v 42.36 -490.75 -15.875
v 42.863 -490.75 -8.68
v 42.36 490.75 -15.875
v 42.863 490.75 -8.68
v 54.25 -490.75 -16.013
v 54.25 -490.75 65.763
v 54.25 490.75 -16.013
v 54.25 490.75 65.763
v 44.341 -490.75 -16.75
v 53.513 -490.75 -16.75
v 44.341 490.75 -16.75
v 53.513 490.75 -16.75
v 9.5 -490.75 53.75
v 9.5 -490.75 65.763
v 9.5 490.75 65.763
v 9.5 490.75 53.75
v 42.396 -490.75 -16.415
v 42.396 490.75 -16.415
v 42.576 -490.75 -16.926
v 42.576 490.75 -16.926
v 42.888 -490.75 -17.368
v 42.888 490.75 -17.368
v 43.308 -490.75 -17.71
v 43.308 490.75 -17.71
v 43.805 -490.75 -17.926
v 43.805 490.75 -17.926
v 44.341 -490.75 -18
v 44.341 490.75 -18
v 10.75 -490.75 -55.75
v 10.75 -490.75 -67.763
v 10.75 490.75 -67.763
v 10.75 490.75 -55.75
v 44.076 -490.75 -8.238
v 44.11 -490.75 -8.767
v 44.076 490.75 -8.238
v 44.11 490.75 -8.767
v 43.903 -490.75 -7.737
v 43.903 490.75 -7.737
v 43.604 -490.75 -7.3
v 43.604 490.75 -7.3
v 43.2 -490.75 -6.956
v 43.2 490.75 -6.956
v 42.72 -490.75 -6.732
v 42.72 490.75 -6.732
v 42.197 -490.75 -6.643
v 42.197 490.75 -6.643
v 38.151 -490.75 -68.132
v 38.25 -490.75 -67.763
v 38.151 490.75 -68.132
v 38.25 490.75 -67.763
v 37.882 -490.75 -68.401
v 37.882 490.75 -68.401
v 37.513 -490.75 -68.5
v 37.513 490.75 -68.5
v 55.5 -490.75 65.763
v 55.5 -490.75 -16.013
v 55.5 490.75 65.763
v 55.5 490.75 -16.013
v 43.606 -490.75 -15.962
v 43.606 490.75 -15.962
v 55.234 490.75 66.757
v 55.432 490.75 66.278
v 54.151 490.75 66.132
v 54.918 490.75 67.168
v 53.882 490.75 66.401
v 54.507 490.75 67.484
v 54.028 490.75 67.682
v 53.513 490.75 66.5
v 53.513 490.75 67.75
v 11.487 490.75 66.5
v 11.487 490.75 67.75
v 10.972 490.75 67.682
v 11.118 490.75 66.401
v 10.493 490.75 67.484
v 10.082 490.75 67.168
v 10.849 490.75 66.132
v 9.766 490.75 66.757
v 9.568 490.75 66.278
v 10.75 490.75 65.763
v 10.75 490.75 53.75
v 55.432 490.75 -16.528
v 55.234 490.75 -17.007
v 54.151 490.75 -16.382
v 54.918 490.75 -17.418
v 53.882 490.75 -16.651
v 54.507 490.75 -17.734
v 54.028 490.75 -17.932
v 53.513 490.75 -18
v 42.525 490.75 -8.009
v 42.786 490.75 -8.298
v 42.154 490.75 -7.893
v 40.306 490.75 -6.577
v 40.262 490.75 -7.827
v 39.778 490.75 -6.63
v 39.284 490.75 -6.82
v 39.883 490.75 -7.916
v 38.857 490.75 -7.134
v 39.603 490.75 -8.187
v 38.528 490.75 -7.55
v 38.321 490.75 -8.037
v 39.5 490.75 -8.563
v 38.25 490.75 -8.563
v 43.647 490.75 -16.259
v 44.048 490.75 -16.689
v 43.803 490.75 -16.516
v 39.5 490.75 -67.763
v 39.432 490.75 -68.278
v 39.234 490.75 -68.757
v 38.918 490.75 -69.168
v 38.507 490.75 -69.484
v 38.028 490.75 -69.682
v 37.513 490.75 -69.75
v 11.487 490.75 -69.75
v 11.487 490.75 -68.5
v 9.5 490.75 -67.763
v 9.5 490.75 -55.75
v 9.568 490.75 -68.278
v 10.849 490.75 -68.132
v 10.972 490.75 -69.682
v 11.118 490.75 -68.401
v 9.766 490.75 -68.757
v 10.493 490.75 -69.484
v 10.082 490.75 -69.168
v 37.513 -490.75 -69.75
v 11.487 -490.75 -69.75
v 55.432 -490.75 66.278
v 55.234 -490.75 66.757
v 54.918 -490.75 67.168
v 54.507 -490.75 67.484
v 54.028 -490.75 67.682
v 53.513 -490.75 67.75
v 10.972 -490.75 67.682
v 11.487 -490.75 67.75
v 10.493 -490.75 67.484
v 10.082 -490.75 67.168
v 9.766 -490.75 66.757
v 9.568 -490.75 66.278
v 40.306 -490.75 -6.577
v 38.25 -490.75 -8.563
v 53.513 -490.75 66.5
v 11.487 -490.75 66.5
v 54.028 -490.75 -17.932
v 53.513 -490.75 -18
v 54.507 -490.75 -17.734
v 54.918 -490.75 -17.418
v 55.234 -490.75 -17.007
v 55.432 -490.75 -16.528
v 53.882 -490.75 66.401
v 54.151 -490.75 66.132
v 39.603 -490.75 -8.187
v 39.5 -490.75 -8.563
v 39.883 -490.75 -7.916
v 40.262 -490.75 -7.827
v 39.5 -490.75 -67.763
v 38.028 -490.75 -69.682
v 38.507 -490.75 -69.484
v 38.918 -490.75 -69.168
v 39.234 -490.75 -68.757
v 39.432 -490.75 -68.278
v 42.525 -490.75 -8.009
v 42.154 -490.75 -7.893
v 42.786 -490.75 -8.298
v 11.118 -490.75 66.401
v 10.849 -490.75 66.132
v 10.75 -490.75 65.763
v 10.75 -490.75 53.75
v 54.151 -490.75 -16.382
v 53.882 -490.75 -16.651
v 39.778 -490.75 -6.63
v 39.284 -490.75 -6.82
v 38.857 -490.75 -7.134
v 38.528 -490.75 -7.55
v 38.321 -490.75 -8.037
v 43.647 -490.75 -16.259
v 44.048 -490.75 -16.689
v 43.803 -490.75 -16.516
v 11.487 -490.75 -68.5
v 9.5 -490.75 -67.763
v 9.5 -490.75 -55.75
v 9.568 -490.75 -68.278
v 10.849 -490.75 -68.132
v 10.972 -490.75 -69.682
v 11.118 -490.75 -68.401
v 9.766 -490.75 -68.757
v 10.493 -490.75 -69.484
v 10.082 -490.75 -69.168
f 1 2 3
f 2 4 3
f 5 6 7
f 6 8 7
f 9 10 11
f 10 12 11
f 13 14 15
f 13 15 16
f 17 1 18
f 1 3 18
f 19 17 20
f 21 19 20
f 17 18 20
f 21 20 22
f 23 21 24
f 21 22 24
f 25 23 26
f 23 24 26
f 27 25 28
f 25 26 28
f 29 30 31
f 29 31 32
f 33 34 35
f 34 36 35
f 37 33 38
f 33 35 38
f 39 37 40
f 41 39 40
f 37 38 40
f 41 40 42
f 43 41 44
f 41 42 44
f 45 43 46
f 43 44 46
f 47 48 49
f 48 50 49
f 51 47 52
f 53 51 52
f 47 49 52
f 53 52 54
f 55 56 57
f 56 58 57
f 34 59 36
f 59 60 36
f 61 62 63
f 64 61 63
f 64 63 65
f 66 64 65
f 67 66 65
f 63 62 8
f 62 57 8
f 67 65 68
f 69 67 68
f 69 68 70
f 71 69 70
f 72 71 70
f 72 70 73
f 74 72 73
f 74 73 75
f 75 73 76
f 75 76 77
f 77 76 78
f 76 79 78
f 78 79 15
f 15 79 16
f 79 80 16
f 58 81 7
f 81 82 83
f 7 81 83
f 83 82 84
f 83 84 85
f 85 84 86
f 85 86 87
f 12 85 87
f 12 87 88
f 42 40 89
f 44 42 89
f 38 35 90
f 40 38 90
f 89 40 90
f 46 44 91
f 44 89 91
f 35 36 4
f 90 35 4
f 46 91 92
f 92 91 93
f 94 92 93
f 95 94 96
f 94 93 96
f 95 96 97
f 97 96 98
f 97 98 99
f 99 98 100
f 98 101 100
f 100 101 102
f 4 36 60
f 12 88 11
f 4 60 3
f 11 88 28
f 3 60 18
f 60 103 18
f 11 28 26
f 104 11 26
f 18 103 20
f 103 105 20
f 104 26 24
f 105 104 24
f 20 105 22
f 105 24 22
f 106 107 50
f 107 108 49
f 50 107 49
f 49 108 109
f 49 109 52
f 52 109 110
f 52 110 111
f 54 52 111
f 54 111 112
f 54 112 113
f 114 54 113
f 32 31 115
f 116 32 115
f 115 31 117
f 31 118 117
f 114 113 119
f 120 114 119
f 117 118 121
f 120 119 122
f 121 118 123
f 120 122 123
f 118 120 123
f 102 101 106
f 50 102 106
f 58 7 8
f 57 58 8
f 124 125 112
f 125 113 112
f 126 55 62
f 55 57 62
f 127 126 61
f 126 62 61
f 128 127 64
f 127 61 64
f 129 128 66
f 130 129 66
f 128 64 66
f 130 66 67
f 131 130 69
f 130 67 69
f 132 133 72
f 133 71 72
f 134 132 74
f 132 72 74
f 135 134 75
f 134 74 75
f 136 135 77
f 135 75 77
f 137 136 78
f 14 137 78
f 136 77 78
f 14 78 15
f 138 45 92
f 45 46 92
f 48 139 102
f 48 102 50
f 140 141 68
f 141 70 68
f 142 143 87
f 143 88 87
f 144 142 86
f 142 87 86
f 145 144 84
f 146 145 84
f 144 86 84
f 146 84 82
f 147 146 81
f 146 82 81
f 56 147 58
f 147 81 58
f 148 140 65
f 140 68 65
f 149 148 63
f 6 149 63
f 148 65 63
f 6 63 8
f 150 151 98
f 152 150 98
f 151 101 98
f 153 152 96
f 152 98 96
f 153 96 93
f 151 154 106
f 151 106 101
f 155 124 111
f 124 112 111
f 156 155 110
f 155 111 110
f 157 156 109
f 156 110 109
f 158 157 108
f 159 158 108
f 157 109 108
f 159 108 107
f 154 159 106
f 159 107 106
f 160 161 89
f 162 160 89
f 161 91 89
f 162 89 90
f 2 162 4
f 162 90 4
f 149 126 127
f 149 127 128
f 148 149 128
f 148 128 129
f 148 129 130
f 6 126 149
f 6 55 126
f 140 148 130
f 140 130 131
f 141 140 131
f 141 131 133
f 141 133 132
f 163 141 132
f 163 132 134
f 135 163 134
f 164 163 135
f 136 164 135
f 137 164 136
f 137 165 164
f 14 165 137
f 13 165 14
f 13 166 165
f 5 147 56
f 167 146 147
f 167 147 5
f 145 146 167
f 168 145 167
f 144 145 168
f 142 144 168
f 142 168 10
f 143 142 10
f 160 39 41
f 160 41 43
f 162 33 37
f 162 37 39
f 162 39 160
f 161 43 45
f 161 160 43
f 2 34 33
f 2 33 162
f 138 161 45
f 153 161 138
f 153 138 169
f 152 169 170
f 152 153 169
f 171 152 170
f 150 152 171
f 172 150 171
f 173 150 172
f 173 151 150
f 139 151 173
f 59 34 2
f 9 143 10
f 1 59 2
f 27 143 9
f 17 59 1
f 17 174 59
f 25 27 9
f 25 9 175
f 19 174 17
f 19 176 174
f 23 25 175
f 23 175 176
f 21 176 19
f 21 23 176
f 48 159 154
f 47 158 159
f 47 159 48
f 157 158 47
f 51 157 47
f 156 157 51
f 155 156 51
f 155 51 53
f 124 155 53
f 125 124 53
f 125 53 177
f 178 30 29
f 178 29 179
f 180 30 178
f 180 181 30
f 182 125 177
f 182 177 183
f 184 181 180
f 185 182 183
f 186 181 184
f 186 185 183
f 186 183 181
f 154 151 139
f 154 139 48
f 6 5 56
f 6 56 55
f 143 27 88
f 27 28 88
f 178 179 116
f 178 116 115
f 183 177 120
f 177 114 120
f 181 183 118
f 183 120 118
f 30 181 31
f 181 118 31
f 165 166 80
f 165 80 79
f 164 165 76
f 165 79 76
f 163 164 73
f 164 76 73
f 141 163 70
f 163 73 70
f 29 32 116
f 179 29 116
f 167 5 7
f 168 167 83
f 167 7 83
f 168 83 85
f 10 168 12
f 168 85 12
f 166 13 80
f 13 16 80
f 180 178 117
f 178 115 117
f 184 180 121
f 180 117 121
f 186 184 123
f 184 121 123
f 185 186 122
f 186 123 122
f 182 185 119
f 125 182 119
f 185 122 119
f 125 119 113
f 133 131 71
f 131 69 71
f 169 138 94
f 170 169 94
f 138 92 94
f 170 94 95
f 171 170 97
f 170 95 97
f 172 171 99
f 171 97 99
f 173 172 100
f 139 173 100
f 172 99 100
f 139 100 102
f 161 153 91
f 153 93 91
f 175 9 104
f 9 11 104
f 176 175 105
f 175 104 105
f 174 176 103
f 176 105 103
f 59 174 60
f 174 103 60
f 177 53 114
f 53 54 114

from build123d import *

# Parameters (mm, degrees)
BASE_FLANGE1_DEPTH = 490.75


# Sheet-metal steps are written as plain solids
with BuildPart() as part:
    # Sketch1 → Base-Flange1 (new, symmetric)
    with BuildSketch(Plane(origin=(0, 0, 0), x_dir=(1, 0, 0), z_dir=(0, 1, 0))):
        with BuildLine():
            Line((9.5, 55.75), (9.5, 67.7634))
            ThreePointArc((9.5, 67.7634), (10.081861668, 69.168138332), (11.4866, 69.75))
            Line((11.4866, 69.75), (37.5134, 69.75))
            ThreePointArc((37.5134, 69.75), (38.918138332, 69.168138332), (39.5, 67.7634))
            Line((39.5, 67.7634), (39.5, 18.25))
            Line((39.5, 18.25), (39.5, 8.562771629))
            ThreePointArc((39.5, 8.562771629), (39.724914644, 8.032905932), (40.262306969, 7.826620346))
            Line((40.262306969, 7.826620346), (42.153527557, 7.892663224))
            ThreePointArc((42.153527557, 7.892663224), (42.675221066, 8.135932903), (42.862626267, 8.680197126))
            Line((42.862626267, 8.680197126), (42.359529101, 15.874821789))
            ThreePointArc((42.359529101, 15.874821789), (42.88838258, 17.368257942), (44.341289843, 18))
            Line((44.341289843, 18), (53.5134, 18))
            ThreePointArc((53.5134, 18), (54.918138332, 17.418138332), (55.5, 16.0134))
            Line((55.5, 16.0134), (55.5, -20.75))
            Line((55.5, -20.75), (55.5, -65.7634))
            ThreePointArc((55.5, -65.7634), (54.918138332, -67.168138332), (53.5134, -67.75))
            Line((53.5134, -67.75), (39.5, -67.75))
            Line((39.5, -67.75), (11.4866, -67.75))
            ThreePointArc((11.4866, -67.75), (10.081861668, -67.168138332), (9.5, -65.7634))
            Line((9.5, -65.7634), (9.5, -53.75))
            Line((9.5, -53.75), (10.75, -53.75))
            Line((10.75, -53.75), (10.75, -65.7634))
            ThreePointArc((10.75, -65.7634), (10.965745145, -66.284254855), (11.4866, -66.5))
            Line((11.4866, -66.5), (39.5, -66.5))
            Line((39.5, -66.5), (53.5134, -66.5))
            ThreePointArc((53.5134, -66.5), (54.034254855, -66.284254855), (54.25, -65.7634))
            Line((54.25, -65.7634), (54.25, -20.75))
            Line((54.25, -20.75), (54.25, 16.0134))
            ThreePointArc((54.25, 16.0134), (54.034254855, 16.534254855), (53.5134, 16.75))
            Line((53.5134, 16.75), (44.341289843, 16.75))
            ThreePointArc((44.341289843, 16.75), (43.802574707, 16.515759992), (43.606484164, 15.962017381))
            Line((43.606484164, 15.962017381), (44.10958133, 8.767392718))
            ThreePointArc((44.10958133, 8.767392718), (43.604152098, 7.299519645), (42.197151928, 6.64342469))
            Line((42.197151928, 6.64342469), (40.30593134, 6.577381812))
            ThreePointArc((40.30593134, 6.577381812), (38.856591681, 7.133731182), (38.25, 8.562771629))
            Line((38.25, 8.562771629), (38.25, 18.25))
            Line((38.25, 18.25), (38.25, 67.7634))
            ThreePointArc((38.25, 67.7634), (38.034254855, 68.284254855), (37.5134, 68.5))
            Line((37.5134, 68.5), (11.4866, 68.5))
            ThreePointArc((11.4866, 68.5), (10.965745145, 68.284254855), (10.75, 67.7634))
            Line((10.75, 67.7634), (10.75, 55.75))
            Line((10.75, 55.75), (9.5, 55.75))
        make_face()
    extrude(amount=BASE_FLANGE1_DEPTH, both=True)


solid = part.part
